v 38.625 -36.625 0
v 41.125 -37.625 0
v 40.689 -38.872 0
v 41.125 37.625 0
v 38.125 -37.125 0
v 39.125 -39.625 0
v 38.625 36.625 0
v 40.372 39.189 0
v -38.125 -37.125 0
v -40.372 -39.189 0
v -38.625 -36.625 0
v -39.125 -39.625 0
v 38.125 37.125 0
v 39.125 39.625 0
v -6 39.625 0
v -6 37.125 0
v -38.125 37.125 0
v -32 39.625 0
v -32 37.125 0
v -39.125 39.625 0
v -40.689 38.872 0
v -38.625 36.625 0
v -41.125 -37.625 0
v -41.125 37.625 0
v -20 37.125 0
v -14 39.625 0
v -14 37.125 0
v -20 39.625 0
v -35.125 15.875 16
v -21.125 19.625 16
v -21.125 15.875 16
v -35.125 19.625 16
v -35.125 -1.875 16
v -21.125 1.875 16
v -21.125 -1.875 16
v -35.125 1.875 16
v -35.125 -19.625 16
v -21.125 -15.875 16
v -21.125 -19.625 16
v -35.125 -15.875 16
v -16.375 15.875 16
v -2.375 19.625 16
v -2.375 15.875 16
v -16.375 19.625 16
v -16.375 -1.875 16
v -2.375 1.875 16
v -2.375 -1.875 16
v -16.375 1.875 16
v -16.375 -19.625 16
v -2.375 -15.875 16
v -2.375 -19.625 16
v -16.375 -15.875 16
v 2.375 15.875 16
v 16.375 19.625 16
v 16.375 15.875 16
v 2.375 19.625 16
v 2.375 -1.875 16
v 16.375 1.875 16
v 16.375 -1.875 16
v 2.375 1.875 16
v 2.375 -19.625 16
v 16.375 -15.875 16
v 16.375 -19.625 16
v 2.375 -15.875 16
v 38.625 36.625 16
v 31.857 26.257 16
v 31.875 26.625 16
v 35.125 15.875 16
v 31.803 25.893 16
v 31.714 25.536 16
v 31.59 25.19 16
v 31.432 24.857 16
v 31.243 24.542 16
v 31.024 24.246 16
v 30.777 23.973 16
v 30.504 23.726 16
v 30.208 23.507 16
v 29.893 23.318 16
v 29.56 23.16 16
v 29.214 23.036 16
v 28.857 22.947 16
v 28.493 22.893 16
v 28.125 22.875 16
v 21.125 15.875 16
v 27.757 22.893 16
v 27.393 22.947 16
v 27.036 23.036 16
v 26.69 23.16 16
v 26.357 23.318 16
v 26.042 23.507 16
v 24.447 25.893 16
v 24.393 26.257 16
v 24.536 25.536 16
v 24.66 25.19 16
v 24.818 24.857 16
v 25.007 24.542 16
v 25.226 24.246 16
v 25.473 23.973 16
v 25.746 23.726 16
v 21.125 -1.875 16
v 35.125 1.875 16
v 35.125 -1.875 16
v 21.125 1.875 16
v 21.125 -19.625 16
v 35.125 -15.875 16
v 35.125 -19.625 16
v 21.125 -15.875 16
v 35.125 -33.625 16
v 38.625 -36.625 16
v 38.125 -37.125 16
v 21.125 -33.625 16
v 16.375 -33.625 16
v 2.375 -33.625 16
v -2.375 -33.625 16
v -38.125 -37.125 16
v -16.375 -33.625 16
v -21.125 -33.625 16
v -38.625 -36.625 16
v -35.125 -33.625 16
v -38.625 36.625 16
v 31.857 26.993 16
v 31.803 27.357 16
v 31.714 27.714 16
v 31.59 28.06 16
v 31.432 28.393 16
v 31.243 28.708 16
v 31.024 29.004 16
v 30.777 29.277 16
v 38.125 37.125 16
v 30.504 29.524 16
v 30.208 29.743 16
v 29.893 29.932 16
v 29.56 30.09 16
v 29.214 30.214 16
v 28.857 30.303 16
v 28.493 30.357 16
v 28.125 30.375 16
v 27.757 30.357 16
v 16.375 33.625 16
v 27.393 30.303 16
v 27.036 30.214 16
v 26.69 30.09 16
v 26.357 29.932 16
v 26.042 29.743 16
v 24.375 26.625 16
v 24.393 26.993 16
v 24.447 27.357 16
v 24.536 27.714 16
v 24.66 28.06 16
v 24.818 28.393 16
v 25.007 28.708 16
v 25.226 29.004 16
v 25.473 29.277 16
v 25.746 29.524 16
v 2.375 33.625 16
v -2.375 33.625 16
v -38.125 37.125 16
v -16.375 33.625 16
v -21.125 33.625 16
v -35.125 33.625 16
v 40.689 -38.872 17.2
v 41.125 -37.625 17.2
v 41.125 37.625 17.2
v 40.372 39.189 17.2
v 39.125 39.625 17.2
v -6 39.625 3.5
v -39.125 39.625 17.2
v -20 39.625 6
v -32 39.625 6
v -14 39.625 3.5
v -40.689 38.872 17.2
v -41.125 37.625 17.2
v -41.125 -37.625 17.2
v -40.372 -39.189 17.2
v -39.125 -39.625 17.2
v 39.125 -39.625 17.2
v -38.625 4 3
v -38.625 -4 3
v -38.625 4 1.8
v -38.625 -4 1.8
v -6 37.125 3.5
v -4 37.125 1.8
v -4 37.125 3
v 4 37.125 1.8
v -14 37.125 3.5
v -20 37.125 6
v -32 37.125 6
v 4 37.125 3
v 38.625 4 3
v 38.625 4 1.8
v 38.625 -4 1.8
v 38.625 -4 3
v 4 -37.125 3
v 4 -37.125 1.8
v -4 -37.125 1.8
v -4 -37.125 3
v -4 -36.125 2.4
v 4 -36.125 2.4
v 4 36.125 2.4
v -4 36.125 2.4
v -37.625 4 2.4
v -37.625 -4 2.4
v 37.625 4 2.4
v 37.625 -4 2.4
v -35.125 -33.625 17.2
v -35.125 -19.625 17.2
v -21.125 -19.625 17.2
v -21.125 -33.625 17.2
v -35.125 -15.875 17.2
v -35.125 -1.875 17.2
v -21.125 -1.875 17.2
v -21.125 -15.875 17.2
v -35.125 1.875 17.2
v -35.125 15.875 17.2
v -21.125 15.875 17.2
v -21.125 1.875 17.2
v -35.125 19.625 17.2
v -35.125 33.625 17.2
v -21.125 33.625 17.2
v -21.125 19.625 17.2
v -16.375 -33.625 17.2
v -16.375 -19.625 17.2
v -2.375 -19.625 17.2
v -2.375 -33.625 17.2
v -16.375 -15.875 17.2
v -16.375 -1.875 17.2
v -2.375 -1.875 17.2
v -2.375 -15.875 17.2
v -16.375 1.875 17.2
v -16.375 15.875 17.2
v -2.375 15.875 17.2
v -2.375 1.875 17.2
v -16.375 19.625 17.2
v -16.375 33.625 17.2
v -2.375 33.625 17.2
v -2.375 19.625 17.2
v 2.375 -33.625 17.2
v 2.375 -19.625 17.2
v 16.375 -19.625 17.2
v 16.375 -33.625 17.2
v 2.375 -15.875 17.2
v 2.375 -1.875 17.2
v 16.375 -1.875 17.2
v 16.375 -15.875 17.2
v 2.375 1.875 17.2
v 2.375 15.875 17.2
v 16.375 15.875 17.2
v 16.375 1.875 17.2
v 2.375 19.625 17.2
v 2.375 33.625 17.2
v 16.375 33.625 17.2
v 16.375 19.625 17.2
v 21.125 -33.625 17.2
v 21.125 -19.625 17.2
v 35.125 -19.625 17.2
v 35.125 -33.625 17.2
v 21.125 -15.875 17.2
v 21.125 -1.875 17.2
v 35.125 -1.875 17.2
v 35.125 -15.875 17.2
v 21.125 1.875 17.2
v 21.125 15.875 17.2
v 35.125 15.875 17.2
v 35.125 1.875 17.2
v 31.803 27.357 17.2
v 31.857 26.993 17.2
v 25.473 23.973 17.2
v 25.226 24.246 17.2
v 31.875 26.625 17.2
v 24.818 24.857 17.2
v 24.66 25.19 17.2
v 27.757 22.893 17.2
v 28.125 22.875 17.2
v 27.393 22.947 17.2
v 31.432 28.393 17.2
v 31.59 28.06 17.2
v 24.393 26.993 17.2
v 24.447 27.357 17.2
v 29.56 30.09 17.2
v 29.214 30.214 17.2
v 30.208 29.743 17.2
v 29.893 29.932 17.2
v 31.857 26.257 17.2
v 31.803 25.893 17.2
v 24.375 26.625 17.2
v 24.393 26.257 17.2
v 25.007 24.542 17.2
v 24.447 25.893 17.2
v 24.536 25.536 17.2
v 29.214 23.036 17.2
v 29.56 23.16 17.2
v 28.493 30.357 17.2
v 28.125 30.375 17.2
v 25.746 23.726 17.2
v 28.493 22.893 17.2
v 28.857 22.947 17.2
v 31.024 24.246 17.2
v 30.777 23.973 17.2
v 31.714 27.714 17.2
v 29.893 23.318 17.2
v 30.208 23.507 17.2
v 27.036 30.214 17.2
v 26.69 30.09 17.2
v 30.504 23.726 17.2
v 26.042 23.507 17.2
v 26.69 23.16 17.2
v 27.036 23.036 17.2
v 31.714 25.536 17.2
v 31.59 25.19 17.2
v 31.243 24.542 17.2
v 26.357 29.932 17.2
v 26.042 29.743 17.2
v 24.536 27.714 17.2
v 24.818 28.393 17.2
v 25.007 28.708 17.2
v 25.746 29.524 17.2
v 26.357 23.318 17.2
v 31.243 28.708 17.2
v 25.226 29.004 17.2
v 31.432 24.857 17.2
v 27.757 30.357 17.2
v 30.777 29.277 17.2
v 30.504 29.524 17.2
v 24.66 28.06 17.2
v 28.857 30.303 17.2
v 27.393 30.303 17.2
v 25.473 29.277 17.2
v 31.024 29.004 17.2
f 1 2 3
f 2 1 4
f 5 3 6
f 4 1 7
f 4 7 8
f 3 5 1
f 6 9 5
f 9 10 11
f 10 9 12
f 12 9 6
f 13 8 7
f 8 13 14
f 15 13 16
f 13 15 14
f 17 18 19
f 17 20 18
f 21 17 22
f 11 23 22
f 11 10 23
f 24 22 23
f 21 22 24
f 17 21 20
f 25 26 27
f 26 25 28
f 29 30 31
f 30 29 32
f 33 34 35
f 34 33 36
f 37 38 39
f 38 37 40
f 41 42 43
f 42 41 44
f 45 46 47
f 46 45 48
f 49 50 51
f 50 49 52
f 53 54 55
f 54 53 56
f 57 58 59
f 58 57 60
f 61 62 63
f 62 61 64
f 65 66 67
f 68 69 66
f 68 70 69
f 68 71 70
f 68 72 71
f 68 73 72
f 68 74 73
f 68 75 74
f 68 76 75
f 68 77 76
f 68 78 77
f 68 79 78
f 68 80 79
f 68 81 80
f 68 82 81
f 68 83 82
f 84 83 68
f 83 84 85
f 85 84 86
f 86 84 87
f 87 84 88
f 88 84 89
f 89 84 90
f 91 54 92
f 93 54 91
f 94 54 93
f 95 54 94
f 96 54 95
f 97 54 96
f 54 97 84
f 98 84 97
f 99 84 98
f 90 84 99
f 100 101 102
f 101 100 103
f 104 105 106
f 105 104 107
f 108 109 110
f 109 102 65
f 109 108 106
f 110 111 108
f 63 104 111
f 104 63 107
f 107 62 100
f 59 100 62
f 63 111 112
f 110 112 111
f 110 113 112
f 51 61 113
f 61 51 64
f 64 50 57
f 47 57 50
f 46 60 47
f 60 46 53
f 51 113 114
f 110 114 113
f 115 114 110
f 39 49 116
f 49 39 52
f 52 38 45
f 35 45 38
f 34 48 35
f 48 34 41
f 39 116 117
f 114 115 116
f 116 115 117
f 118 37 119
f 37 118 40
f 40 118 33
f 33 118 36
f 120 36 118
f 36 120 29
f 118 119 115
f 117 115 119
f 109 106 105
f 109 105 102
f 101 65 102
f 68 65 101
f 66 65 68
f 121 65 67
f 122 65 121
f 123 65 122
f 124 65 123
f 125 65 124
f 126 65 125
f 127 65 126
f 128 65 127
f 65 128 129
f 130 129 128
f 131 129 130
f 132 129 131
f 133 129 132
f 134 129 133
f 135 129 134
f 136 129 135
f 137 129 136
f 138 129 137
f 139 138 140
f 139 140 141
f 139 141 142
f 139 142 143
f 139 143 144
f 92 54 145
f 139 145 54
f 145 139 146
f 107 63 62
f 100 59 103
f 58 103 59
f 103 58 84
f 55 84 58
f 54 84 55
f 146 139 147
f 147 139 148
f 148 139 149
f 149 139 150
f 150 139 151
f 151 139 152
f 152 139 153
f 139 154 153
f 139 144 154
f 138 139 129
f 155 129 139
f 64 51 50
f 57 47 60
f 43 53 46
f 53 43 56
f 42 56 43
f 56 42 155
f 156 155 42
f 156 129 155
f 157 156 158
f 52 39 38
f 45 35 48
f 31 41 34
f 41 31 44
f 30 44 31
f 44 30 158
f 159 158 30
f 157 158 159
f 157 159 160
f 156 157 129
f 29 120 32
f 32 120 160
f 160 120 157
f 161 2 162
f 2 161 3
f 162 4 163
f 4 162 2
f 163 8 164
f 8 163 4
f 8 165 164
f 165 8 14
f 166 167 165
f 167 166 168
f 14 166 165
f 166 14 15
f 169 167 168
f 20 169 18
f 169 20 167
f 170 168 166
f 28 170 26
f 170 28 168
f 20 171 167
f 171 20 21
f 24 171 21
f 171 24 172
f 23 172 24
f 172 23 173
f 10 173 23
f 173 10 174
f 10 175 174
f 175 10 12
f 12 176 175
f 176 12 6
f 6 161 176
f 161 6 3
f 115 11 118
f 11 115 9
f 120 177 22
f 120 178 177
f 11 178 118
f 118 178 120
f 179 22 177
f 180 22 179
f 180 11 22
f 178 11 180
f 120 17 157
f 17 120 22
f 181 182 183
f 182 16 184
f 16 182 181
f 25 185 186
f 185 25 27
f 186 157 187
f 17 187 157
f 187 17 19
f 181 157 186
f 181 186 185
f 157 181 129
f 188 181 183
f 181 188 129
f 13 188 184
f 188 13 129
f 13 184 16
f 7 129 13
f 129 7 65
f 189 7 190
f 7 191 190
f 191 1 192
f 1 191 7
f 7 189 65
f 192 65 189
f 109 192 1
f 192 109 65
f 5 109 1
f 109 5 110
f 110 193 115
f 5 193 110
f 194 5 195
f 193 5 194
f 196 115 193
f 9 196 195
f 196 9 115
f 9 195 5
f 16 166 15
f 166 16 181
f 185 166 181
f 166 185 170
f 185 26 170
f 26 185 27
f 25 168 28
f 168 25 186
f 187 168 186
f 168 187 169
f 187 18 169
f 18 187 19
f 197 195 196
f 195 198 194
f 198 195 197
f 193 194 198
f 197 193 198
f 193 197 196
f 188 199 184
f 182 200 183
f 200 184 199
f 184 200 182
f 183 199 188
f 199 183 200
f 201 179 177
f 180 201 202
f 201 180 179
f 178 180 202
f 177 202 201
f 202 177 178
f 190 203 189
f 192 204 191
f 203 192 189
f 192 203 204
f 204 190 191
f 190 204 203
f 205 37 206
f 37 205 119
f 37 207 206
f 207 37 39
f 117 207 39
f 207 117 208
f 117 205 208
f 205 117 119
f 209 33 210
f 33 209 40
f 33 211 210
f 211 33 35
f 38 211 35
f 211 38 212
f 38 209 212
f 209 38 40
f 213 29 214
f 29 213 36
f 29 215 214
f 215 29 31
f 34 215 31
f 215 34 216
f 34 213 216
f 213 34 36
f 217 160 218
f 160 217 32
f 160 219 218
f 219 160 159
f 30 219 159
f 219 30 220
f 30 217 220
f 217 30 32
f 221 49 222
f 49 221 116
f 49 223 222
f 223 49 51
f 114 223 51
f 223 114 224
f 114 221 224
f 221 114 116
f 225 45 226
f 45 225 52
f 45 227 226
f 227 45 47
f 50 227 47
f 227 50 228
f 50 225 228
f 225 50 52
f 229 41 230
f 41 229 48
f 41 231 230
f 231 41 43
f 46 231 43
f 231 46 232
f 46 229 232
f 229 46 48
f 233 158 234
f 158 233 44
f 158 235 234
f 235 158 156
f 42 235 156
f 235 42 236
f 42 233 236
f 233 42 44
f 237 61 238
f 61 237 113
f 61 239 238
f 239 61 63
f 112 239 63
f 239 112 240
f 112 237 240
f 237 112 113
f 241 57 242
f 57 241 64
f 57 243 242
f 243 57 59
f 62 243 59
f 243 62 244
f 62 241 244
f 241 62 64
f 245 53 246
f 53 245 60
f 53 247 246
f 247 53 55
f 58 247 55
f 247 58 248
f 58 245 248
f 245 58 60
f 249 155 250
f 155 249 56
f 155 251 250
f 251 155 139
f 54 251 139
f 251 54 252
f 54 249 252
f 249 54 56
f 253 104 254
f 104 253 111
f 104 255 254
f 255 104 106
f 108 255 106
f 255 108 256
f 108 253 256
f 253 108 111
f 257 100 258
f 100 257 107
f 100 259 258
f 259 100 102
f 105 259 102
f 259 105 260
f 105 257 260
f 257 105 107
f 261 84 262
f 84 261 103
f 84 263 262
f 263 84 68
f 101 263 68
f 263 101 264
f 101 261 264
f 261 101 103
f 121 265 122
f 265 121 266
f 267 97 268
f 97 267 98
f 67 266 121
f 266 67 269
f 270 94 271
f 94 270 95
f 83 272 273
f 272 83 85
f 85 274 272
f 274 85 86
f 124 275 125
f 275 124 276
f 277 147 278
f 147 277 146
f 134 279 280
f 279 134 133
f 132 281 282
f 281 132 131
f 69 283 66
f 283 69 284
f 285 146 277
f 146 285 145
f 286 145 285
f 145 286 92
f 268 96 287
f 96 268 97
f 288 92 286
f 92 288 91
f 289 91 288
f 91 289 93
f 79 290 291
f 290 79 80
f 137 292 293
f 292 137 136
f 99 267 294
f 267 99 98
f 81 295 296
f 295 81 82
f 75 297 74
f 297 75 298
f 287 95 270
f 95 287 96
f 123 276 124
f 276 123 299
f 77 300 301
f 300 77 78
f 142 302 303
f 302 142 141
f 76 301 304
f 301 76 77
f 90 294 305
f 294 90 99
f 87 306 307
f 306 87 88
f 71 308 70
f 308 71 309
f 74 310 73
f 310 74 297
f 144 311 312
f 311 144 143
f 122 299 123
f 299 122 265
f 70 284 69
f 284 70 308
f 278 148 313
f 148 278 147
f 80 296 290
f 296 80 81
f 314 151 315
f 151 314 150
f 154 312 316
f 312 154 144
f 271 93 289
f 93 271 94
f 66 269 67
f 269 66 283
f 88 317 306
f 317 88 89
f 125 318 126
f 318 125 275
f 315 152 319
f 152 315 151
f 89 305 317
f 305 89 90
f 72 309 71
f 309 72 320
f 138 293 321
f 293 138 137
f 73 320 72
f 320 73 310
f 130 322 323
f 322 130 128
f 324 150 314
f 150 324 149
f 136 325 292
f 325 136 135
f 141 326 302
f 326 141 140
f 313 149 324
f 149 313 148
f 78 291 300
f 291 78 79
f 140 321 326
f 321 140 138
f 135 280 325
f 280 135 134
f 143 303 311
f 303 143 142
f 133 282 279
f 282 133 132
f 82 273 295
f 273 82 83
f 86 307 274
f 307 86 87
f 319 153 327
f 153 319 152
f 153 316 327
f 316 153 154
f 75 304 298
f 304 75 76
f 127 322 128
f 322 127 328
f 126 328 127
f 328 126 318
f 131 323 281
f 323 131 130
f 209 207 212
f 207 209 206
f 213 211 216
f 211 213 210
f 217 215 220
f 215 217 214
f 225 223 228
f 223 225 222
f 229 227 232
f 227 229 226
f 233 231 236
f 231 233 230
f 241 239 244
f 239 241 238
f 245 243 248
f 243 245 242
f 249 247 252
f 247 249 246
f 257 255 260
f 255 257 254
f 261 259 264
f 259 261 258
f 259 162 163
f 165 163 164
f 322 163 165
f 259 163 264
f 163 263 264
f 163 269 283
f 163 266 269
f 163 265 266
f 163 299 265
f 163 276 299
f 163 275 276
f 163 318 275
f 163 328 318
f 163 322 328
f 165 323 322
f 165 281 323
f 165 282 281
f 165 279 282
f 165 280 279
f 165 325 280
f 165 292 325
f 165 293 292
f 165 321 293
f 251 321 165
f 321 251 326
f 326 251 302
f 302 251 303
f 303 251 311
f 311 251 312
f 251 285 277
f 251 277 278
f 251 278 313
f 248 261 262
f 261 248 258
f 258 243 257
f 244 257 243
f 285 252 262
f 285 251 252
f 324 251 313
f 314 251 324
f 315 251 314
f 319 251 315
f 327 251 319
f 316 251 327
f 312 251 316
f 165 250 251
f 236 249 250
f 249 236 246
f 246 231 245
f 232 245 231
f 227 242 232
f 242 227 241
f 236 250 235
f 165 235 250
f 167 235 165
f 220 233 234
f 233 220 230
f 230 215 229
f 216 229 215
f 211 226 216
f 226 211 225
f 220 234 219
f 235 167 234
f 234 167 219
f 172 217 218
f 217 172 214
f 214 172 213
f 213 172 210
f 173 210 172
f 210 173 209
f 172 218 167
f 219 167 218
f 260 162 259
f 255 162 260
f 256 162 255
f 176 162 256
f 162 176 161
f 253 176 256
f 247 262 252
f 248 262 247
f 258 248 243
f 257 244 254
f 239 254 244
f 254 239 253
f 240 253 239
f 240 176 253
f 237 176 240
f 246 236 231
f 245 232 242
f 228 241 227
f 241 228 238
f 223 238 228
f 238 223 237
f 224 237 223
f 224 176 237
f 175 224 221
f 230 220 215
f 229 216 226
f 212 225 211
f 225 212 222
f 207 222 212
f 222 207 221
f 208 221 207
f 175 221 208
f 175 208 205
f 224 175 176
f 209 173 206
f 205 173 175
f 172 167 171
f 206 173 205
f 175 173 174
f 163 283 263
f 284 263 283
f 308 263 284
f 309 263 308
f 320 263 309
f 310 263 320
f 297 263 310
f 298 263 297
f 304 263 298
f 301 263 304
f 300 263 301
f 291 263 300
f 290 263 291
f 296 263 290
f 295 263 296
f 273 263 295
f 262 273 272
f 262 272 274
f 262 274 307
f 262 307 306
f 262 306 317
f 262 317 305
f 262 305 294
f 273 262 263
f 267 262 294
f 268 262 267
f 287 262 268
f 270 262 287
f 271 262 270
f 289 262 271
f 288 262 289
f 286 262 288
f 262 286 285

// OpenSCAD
// ============================================================
//  Caldera Numpad Case
//  4x4 Choc switch plate + side walls + snap ridges (inward)
// ============================================================

switch_cutout    = 14;
cols             = 4;
rows             = 4;
pitch_x          = 18.75;  // cx + spacing (18 + 0.75)
pitch_y          = 17.75;  // cy + spacing (17 + 0.75)
plate_thickness  = 1.2;
wall_thickness   = 2.5;
wall_height      = 16.0;
fillet_r         = 2.0;
pad_x            = 6;
pad_y            = 6;

// Back wall cutouts (left of the snap ridge)
usb_cutout_w     = 12.0;  // USB-C width (X)
usb_cutout_h     = 6.0;   // USB-C height (Z), from case floor up
sw_cutout_w      = 8.0;   // power switch width (X)
sw_cutout_h      = 3.5;   // power switch height (Z)
cutout_gap       = 6.0;   // gap between the two cutouts

// Snap ridge
ridge_height     = 1.2;   // vertical thickness of the shelf
ridge_depth      = 1.0;   // how far it sticks inward from the wall
ridge_width      = 8.0;   // length along the wall
ridge_z          = 3.0;   // Z of the TOP of the ridge from case bottom

board_w = (cols - 1) * pitch_x + switch_cutout + pad_x * 2;
board_h = (rows - 1) * pitch_y + switch_cutout + pad_y * 2;

module rounded_rect(w, h, r) {
    offset(r=r) offset(r=-r) square([w, h], center=true);
}

// --- Single ridge -------------------------------------------
//  A horizontal wedge: flat on top (hook locks here),
//  angled on the bottom (hook cams up over it on insertion).
//  Profile is in the XZ plane, extruded along Y for ridge_width.
//  Protrudes in +X direction (caller mirrors/rotates for each wall).
//
//        wall
//         |\_____  <- flat top face (hook locks here)
//         |      \
//         |       \ <- angled bottom face (hook slides up this)
//         |________\
//
module ridge() {
    translate([0, ridge_width/2, 0])
        rotate([90, 0, 0])
            linear_extrude(ridge_width)
                polygon([
                    [0,           0          ],  // wall base
                    [ridge_depth, ridge_height/2],  // outer tip bottom (angled)
                    [0,           ridge_height]  // wall top (flat top face)
                ]);
}

// --- Four ridges, one per wall, all protruding inward -------
module snap_ridges() {
    z = ridge_z - ridge_height;

    // Front wall (inner face at Y = -board_h/2 + wall_thickness)
    // protrudes inward = +Y direction → rotate ridge to point +Y
    translate([0, -board_h/2 + wall_thickness, z])
        rotate([0, 0, 90])
            ridge();

    // Back wall (inner face at Y = +board_h/2 - wall_thickness)
    // protrudes inward = -Y direction
    translate([0, board_h/2 - wall_thickness, z])
        rotate([0, 0, -90])
            ridge();

    // Left wall (inner face at X = -board_w/2 + wall_thickness)
    // protrudes inward = +X direction
    translate([-board_w/2 + wall_thickness, 0, z])
        ridge();

    // Right wall (inner face at X = +board_w/2 - wall_thickness)
    // protrudes inward = -X direction
    translate([board_w/2 - wall_thickness, 0, z])
        mirror([1, 0, 0])
            ridge();
}

module plate() {
    difference() {
        linear_extrude(plate_thickness)
            rounded_rect(board_w, board_h, fillet_r);
for (c = [0 : cols - 1]) {
            for (r = [0 : rows - 1]) {
                x = (c - (cols - 1) / 2) * pitch_x;
                y = (r - (rows - 1) / 2) * pitch_y;
                translate([x, y, -0.1])
                    linear_extrude(plate_thickness + 0.2)
                        if (c == cols - 1 && r == rows - 1)
                            circle(r = 3.75, $fn = 64);  // encoder shaft hole (7.5mm diameter)
                        else
                            square([switch_cutout, switch_cutout], center=true);
            }
        }
    }
}

module walls() {
    linear_extrude(wall_height)
        difference() {
            rounded_rect(board_w, board_h, fillet_r);
            rounded_rect(board_w - wall_thickness * 2,
                         board_h - wall_thickness * 2,
                         max(fillet_r - wall_thickness, 0.5));
        }
}

module numpad_case() {
    color("SlateGray") difference() {
        walls();
        // Power switch cutout — 2mm left of the ridge, flush with floor
        translate([-(ridge_width/2 + 2 + sw_cutout_w), board_h/2 - wall_thickness - 0.1, 0])
            cube([sw_cutout_w, wall_thickness + 0.2, sw_cutout_h]);
        // USB-C cutout — left of power switch with cutout_gap, flush with floor
        translate([-(ridge_width/2 + 2 + sw_cutout_w + cutout_gap + usb_cutout_w), board_h/2 - wall_thickness - 0.1, 0])
            cube([usb_cutout_w, wall_thickness + 0.2, usb_cutout_h]);
    }
    color("SlateGray") snap_ridges();
    color("DimGray")   translate([0, 0, wall_height]) plate();
}

numpad_case();
